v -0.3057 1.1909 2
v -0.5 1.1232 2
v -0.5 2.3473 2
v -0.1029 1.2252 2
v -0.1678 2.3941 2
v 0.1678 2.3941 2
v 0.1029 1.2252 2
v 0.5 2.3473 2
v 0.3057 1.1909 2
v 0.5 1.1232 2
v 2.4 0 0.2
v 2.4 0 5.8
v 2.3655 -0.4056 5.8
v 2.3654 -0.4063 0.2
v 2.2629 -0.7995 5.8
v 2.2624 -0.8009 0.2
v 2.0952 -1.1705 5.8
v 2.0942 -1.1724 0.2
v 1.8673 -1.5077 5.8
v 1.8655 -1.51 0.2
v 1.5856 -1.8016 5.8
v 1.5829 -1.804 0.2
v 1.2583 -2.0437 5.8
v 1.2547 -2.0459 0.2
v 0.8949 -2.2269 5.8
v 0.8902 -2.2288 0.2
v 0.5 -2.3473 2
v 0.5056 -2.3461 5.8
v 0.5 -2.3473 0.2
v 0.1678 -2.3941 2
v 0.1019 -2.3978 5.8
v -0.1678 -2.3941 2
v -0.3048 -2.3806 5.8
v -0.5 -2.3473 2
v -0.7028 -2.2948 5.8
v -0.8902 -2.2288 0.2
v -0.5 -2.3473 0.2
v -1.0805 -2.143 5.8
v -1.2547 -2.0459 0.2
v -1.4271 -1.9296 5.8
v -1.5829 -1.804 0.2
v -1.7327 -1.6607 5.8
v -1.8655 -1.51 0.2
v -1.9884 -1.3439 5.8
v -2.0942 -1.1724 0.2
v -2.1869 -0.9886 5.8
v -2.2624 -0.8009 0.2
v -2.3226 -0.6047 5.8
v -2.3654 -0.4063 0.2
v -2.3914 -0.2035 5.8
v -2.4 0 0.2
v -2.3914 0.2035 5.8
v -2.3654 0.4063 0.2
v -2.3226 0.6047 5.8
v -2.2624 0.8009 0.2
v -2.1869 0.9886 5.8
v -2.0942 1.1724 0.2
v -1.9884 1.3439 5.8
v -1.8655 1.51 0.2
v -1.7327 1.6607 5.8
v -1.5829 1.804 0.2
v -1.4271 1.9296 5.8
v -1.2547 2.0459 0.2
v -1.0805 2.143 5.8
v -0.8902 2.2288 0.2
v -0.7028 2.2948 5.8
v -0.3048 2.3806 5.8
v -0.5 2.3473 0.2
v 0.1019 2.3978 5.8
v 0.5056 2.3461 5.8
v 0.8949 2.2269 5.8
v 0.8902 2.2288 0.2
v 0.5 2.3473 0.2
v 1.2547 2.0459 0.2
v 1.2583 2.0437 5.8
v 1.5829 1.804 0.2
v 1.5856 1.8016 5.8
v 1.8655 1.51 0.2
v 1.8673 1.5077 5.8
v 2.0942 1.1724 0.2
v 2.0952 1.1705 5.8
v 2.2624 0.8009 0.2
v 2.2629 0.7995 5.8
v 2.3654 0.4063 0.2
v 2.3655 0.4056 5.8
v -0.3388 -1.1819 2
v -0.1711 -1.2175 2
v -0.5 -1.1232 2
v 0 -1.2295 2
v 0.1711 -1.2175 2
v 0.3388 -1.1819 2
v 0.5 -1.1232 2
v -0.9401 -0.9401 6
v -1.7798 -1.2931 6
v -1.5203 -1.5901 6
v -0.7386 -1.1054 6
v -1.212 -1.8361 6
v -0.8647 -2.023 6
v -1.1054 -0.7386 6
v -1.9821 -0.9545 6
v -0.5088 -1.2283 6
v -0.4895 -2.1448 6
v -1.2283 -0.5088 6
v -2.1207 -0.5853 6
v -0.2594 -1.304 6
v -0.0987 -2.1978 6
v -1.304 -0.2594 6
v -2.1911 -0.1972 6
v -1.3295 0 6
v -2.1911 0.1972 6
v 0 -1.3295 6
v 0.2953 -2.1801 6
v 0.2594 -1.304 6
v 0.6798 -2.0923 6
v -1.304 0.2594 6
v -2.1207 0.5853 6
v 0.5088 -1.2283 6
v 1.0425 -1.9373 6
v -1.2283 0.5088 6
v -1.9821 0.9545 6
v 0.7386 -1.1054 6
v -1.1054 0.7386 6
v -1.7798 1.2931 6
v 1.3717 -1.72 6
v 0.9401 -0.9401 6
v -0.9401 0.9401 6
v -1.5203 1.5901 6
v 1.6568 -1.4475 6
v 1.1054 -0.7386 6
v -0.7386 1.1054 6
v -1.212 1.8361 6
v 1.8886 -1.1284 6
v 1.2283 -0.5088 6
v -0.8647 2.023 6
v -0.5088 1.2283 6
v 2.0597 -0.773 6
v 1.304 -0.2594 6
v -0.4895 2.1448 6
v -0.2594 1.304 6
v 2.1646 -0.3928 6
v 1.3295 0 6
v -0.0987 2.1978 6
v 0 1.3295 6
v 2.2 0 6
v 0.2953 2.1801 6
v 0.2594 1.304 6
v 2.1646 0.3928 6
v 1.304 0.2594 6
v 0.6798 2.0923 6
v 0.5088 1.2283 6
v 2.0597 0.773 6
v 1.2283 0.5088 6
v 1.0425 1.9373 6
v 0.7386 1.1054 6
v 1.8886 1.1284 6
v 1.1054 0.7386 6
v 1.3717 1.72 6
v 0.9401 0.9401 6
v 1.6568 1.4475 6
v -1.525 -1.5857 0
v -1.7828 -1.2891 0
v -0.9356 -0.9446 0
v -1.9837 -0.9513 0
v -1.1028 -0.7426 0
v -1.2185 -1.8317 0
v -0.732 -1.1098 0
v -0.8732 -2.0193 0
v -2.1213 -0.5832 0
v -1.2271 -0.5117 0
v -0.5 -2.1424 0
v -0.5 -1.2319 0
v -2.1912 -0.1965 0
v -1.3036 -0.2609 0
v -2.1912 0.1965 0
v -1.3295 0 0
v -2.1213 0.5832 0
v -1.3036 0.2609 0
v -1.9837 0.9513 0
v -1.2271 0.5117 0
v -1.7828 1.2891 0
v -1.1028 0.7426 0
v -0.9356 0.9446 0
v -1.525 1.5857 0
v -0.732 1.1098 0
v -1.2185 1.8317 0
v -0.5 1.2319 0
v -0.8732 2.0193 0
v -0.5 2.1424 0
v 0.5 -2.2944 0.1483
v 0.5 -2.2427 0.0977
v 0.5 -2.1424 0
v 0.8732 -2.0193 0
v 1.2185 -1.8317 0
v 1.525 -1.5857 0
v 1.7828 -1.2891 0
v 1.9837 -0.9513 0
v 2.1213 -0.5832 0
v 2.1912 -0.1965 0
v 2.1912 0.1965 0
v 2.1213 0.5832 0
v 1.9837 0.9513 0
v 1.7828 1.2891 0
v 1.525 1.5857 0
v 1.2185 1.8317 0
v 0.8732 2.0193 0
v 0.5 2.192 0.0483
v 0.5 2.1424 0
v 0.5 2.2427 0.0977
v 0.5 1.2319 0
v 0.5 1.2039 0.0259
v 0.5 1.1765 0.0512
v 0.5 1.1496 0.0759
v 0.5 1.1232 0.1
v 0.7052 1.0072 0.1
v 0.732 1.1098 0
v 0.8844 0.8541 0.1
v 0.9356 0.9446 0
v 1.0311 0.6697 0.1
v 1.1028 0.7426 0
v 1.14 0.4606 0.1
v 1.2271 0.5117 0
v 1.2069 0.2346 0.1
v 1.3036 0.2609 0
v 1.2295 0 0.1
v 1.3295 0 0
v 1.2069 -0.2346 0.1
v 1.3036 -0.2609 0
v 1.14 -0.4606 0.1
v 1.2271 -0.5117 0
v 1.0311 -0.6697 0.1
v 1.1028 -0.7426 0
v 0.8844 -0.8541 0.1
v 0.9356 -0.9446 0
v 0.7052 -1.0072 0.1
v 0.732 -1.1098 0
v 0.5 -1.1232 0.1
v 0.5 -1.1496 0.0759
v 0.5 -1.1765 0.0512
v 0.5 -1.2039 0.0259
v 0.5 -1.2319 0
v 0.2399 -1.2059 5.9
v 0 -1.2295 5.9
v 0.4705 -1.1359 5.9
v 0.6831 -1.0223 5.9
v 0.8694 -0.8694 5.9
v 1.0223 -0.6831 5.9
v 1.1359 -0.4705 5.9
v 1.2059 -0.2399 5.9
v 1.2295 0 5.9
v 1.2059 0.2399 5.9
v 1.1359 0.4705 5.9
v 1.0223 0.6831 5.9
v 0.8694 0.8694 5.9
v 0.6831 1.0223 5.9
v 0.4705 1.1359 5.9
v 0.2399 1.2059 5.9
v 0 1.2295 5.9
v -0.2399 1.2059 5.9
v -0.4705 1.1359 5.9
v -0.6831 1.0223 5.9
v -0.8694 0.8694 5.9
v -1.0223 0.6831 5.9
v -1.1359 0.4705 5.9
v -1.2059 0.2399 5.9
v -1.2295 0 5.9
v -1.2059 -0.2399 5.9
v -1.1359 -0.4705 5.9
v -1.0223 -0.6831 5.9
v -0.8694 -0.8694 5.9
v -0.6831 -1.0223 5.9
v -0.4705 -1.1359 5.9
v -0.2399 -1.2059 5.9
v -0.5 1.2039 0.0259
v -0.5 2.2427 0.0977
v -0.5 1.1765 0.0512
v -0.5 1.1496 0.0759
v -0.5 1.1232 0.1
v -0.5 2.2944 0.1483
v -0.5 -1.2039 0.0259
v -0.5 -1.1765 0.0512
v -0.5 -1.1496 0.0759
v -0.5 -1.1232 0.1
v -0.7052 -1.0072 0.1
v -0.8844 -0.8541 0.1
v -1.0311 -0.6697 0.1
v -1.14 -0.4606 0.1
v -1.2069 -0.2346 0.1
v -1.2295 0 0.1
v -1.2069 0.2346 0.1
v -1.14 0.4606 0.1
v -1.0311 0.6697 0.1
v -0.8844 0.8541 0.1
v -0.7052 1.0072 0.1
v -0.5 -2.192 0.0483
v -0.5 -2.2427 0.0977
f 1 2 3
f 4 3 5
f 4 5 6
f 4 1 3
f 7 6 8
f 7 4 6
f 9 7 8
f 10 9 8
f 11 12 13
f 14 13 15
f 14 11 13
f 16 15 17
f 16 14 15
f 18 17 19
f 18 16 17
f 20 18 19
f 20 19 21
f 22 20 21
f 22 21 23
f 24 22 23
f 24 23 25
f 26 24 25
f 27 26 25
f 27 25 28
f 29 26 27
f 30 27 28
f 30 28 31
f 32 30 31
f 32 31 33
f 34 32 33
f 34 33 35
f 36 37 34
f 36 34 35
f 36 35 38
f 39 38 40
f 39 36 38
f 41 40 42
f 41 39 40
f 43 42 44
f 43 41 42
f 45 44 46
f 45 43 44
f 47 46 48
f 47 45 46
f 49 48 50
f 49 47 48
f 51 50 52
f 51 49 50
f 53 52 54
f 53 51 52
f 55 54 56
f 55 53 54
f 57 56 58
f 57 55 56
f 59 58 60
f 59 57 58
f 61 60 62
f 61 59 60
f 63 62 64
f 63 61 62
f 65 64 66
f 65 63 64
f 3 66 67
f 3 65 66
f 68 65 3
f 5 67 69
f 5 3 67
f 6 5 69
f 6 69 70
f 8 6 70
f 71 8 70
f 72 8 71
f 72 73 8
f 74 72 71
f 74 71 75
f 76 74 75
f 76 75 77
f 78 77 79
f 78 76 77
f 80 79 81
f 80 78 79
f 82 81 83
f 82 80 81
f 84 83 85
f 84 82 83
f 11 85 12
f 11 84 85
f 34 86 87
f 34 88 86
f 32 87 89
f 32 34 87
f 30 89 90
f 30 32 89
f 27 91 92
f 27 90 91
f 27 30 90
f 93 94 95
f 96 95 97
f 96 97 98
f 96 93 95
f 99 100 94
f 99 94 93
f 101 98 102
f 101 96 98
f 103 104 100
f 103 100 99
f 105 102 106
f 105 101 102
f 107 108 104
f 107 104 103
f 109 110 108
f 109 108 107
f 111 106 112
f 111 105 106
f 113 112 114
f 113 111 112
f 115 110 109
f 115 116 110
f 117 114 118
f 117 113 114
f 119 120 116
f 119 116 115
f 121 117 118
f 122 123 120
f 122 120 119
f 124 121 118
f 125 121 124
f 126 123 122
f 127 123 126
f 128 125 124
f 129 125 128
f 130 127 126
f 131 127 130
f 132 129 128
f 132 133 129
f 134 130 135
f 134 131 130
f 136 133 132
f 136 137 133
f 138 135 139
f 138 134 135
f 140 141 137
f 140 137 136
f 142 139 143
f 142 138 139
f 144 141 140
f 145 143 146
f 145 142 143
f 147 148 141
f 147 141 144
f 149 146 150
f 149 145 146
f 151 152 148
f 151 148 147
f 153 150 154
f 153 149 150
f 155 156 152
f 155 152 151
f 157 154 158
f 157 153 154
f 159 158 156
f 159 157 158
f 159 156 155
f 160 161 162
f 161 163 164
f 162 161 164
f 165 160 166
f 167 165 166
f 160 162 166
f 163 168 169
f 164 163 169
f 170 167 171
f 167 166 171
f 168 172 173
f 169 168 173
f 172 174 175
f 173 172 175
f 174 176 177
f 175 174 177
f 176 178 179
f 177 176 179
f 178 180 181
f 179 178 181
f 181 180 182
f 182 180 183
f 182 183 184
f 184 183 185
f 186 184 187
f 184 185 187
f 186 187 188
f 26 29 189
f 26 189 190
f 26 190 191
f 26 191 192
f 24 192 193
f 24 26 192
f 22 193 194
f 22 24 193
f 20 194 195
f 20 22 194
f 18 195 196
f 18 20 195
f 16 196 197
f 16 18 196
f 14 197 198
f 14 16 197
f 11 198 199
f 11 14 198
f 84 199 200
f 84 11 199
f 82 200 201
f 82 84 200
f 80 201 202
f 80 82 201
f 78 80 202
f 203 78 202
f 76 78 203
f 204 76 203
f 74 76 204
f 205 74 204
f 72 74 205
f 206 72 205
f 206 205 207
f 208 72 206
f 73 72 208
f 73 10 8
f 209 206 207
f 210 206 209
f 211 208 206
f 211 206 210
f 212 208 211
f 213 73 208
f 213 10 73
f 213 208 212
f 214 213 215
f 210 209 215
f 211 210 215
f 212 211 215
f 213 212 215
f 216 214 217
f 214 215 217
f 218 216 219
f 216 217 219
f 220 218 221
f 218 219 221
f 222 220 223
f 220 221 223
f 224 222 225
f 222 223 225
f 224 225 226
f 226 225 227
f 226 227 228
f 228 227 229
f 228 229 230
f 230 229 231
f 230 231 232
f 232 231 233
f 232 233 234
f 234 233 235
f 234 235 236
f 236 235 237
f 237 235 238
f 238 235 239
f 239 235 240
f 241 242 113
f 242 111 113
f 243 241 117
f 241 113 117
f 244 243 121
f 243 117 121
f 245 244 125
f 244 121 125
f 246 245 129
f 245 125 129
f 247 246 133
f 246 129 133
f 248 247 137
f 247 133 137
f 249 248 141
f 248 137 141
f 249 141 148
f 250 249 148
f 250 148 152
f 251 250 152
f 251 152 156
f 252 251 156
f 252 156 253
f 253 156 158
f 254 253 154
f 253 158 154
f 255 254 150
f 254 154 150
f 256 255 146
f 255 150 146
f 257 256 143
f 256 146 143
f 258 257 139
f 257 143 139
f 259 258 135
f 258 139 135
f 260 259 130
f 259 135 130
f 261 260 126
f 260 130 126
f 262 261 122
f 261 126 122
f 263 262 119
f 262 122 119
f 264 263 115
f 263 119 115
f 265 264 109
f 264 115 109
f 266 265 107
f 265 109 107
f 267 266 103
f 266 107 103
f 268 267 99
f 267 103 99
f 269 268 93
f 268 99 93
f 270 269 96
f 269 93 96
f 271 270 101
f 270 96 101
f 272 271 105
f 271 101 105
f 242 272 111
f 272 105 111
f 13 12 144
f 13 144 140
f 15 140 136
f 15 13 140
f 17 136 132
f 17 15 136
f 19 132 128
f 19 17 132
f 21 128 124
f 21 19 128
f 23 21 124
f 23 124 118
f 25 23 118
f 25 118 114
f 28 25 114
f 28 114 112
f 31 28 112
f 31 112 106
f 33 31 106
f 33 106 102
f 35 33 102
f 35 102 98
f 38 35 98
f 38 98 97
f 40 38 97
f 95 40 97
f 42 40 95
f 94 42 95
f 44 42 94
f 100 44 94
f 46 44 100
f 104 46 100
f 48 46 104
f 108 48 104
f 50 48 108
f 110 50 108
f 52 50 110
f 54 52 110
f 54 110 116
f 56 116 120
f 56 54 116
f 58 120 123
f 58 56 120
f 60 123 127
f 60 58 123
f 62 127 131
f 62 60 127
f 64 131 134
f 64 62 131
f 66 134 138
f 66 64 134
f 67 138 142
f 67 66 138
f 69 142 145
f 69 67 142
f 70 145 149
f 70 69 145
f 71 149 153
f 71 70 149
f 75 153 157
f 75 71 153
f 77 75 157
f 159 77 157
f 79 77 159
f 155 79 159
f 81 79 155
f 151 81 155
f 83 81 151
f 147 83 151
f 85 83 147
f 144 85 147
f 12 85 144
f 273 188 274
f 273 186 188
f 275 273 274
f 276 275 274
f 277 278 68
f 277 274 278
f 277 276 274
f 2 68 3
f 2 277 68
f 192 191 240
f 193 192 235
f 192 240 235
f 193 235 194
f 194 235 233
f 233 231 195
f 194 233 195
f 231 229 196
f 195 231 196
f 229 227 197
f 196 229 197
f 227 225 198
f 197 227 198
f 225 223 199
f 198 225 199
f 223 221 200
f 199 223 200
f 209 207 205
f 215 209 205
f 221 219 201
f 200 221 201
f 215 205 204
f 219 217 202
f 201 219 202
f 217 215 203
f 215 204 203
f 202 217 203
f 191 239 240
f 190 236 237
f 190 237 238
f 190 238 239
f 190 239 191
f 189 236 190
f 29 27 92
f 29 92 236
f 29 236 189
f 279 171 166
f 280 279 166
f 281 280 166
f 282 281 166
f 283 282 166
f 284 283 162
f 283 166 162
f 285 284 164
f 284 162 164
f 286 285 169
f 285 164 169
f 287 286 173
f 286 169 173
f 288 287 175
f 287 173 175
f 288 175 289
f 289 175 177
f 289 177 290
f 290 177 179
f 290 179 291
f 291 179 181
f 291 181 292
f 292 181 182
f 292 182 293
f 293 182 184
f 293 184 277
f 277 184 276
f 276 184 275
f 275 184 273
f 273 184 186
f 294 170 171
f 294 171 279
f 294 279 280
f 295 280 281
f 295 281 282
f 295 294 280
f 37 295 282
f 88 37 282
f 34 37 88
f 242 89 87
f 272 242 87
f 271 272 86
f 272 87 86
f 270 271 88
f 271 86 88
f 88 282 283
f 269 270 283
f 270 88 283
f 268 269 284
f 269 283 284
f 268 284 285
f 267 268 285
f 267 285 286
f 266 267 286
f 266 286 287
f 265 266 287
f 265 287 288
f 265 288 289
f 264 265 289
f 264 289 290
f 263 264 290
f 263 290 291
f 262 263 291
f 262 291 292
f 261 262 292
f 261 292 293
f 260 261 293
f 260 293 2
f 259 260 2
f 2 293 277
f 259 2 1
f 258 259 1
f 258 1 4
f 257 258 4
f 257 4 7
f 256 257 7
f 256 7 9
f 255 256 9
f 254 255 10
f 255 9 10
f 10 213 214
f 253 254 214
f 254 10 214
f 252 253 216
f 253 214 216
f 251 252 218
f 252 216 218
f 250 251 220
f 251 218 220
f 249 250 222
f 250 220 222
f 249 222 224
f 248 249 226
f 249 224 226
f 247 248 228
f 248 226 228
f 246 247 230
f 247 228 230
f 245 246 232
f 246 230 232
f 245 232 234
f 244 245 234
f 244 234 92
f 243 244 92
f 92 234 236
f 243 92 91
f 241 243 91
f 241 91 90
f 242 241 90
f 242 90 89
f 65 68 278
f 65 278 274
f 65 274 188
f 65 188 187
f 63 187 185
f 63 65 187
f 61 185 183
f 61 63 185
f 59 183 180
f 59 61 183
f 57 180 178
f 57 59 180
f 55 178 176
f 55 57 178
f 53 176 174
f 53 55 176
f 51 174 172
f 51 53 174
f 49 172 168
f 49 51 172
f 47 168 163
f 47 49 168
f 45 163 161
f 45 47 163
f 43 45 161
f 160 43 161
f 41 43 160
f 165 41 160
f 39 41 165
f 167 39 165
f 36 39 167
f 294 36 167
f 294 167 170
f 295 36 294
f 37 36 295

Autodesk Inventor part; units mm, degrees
ref_plane "YZ Plane" through (0, 0, 0) normal (1, 0, 0) x (0, 1, 0)
ref_plane "XZ Plane" through (0, 0, 0) normal (0, 1, 0) x (-1, 0, 0)
ref_plane "XY Plane" through (0, 0, 0) normal (0, 0, 1) x (1, 0, 0)
sketch "Sketch1" plane through (0, 0, 0) normal (0, 0, 1) x (1, 0, 0)
  circle A0 centre (0, 0) radius 2.4
  dimension "d0" = 4.8
extrude "Extrusion1" add sketch "Sketch1" along normal blind 6
sketch "Sketch2" plane through (0, 0, 6) normal (0, 0, 1) x (1, 0, 0)
  point P0 (0, 0)
  point P1 (0, 0)
hole "Hole1" at (0, 0, 6) direction (0, 0, -1) diameter 2.459 end through all thread size "M3x0.5" class "6H" standard "ISO Metric profile"
chamfer "Chamfer1" distance 0.2 angle 45 2 edges at (-2.4, 0, 6) (-2.4, 0, 0)
chamfer "Chamfer2" distance 0.1 angle 45 2 edges at (0, 1.2295, 6) (0, 1.2295, 0)
thread "Thread2" size "M5x0.8" class "6g" standard "ANSI Metric M Profile" full length
sketch "Sketch4" plane through (0, 0, 0) normal (0, 1, 0) x (-1, 0, 0)
  line L0 (-0.5, 0) -> (0.5, 0)
  line L1 (0.5, 0) -> (0.5, 2)
  line L2 (0.5, 2) -> (-0.5, 2)
  line L3 (-0.5, 2) -> (-0.5, 0)
  point P0 (0, 0)
  dimension "d22" = 1
  dimension "d23" = 0.5
  dimension "d24" = 2
extrude "Extrusion2" cut sketch "Sketch4" along normal mid plane 6
equation "\"d23\" = 0.5 * d22"
properties part number "XGEN_M3_draadbus_4x6mm"
